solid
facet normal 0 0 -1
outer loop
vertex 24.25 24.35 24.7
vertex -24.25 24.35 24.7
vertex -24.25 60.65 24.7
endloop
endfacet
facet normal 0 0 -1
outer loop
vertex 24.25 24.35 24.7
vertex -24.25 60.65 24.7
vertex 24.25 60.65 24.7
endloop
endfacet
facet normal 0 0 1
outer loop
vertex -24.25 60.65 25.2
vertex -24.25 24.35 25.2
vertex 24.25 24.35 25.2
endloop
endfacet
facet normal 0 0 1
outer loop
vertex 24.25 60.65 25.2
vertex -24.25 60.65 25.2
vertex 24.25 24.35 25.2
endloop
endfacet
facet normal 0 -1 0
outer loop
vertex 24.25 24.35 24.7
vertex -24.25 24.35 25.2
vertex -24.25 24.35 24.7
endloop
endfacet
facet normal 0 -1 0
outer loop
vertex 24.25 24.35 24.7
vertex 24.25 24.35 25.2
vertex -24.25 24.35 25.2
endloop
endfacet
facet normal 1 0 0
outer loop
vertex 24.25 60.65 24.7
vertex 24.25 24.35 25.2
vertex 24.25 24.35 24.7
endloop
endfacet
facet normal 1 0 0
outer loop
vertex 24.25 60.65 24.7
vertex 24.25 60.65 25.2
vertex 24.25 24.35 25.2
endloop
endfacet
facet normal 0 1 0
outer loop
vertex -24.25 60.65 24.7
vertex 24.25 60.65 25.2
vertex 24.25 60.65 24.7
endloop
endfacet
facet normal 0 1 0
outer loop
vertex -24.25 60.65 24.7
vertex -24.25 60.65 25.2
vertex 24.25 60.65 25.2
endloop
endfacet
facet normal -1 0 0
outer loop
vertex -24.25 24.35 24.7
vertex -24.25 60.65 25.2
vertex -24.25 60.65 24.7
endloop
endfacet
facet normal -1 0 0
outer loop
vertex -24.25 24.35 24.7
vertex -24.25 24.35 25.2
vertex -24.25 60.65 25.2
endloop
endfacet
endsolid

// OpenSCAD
// RENDER-ONLY props: display, labels, ball and screw heads. Not electrical parts.
part="display";
$fn=40;
module box(w,h,t) {linear_extrude(t) square([w,h],center=true);}
module label(t,p,size=2) {translate(p) linear_extrude(0.05) text(t,size=size,halign="center",valign="center",font="DejaVu Sans:style=Bold");}
if(part=="display") translate([0,42.5,24.7]) box(48.5,36.3,0.5);
if(part=="ball") translate([0,8,23.5]) sphere(r=4.8);
if(part=="ring") translate([0,8,25.5]) difference() {cylinder(d=15,h=0.45);translate([0,0,-0.1]) cylinder(d=11.2,h=1);}
if(part=="screws") for(x=[-30.5,30.5],y=[-68,68]) translate([x,y,25]) difference() {
 cylinder(d=3.8,h=0.8);translate([0,0,0.5]) cube([2.5,0.6,1],center=true);
}
if(part=="legends") {
 names=["1","2","3","A","4","5","6","B","7","8","9","C","*","0","#","D"];
 for(i=[0:15]) label(names[i],[-22.5+(i%4)*15,-11-floor(i/4)*15,25.92],2.4);
 label("MESH",[0,-66,26.01],1.8);
 label("915",[-25,8,26.01],1.5);label("GPS",[25,8,26.01],1.5);
}
if(part=="ui") {
 label("MESH / 4G",[0,57.5,25.22],1.9);
 label("12:42",[0,45.5,25.22],6);
 label("LORA    GPS    NFC",[0,31.5,25.22],1.65);
 label("CONNECTED",[0,26,25.22],1.2);
}
